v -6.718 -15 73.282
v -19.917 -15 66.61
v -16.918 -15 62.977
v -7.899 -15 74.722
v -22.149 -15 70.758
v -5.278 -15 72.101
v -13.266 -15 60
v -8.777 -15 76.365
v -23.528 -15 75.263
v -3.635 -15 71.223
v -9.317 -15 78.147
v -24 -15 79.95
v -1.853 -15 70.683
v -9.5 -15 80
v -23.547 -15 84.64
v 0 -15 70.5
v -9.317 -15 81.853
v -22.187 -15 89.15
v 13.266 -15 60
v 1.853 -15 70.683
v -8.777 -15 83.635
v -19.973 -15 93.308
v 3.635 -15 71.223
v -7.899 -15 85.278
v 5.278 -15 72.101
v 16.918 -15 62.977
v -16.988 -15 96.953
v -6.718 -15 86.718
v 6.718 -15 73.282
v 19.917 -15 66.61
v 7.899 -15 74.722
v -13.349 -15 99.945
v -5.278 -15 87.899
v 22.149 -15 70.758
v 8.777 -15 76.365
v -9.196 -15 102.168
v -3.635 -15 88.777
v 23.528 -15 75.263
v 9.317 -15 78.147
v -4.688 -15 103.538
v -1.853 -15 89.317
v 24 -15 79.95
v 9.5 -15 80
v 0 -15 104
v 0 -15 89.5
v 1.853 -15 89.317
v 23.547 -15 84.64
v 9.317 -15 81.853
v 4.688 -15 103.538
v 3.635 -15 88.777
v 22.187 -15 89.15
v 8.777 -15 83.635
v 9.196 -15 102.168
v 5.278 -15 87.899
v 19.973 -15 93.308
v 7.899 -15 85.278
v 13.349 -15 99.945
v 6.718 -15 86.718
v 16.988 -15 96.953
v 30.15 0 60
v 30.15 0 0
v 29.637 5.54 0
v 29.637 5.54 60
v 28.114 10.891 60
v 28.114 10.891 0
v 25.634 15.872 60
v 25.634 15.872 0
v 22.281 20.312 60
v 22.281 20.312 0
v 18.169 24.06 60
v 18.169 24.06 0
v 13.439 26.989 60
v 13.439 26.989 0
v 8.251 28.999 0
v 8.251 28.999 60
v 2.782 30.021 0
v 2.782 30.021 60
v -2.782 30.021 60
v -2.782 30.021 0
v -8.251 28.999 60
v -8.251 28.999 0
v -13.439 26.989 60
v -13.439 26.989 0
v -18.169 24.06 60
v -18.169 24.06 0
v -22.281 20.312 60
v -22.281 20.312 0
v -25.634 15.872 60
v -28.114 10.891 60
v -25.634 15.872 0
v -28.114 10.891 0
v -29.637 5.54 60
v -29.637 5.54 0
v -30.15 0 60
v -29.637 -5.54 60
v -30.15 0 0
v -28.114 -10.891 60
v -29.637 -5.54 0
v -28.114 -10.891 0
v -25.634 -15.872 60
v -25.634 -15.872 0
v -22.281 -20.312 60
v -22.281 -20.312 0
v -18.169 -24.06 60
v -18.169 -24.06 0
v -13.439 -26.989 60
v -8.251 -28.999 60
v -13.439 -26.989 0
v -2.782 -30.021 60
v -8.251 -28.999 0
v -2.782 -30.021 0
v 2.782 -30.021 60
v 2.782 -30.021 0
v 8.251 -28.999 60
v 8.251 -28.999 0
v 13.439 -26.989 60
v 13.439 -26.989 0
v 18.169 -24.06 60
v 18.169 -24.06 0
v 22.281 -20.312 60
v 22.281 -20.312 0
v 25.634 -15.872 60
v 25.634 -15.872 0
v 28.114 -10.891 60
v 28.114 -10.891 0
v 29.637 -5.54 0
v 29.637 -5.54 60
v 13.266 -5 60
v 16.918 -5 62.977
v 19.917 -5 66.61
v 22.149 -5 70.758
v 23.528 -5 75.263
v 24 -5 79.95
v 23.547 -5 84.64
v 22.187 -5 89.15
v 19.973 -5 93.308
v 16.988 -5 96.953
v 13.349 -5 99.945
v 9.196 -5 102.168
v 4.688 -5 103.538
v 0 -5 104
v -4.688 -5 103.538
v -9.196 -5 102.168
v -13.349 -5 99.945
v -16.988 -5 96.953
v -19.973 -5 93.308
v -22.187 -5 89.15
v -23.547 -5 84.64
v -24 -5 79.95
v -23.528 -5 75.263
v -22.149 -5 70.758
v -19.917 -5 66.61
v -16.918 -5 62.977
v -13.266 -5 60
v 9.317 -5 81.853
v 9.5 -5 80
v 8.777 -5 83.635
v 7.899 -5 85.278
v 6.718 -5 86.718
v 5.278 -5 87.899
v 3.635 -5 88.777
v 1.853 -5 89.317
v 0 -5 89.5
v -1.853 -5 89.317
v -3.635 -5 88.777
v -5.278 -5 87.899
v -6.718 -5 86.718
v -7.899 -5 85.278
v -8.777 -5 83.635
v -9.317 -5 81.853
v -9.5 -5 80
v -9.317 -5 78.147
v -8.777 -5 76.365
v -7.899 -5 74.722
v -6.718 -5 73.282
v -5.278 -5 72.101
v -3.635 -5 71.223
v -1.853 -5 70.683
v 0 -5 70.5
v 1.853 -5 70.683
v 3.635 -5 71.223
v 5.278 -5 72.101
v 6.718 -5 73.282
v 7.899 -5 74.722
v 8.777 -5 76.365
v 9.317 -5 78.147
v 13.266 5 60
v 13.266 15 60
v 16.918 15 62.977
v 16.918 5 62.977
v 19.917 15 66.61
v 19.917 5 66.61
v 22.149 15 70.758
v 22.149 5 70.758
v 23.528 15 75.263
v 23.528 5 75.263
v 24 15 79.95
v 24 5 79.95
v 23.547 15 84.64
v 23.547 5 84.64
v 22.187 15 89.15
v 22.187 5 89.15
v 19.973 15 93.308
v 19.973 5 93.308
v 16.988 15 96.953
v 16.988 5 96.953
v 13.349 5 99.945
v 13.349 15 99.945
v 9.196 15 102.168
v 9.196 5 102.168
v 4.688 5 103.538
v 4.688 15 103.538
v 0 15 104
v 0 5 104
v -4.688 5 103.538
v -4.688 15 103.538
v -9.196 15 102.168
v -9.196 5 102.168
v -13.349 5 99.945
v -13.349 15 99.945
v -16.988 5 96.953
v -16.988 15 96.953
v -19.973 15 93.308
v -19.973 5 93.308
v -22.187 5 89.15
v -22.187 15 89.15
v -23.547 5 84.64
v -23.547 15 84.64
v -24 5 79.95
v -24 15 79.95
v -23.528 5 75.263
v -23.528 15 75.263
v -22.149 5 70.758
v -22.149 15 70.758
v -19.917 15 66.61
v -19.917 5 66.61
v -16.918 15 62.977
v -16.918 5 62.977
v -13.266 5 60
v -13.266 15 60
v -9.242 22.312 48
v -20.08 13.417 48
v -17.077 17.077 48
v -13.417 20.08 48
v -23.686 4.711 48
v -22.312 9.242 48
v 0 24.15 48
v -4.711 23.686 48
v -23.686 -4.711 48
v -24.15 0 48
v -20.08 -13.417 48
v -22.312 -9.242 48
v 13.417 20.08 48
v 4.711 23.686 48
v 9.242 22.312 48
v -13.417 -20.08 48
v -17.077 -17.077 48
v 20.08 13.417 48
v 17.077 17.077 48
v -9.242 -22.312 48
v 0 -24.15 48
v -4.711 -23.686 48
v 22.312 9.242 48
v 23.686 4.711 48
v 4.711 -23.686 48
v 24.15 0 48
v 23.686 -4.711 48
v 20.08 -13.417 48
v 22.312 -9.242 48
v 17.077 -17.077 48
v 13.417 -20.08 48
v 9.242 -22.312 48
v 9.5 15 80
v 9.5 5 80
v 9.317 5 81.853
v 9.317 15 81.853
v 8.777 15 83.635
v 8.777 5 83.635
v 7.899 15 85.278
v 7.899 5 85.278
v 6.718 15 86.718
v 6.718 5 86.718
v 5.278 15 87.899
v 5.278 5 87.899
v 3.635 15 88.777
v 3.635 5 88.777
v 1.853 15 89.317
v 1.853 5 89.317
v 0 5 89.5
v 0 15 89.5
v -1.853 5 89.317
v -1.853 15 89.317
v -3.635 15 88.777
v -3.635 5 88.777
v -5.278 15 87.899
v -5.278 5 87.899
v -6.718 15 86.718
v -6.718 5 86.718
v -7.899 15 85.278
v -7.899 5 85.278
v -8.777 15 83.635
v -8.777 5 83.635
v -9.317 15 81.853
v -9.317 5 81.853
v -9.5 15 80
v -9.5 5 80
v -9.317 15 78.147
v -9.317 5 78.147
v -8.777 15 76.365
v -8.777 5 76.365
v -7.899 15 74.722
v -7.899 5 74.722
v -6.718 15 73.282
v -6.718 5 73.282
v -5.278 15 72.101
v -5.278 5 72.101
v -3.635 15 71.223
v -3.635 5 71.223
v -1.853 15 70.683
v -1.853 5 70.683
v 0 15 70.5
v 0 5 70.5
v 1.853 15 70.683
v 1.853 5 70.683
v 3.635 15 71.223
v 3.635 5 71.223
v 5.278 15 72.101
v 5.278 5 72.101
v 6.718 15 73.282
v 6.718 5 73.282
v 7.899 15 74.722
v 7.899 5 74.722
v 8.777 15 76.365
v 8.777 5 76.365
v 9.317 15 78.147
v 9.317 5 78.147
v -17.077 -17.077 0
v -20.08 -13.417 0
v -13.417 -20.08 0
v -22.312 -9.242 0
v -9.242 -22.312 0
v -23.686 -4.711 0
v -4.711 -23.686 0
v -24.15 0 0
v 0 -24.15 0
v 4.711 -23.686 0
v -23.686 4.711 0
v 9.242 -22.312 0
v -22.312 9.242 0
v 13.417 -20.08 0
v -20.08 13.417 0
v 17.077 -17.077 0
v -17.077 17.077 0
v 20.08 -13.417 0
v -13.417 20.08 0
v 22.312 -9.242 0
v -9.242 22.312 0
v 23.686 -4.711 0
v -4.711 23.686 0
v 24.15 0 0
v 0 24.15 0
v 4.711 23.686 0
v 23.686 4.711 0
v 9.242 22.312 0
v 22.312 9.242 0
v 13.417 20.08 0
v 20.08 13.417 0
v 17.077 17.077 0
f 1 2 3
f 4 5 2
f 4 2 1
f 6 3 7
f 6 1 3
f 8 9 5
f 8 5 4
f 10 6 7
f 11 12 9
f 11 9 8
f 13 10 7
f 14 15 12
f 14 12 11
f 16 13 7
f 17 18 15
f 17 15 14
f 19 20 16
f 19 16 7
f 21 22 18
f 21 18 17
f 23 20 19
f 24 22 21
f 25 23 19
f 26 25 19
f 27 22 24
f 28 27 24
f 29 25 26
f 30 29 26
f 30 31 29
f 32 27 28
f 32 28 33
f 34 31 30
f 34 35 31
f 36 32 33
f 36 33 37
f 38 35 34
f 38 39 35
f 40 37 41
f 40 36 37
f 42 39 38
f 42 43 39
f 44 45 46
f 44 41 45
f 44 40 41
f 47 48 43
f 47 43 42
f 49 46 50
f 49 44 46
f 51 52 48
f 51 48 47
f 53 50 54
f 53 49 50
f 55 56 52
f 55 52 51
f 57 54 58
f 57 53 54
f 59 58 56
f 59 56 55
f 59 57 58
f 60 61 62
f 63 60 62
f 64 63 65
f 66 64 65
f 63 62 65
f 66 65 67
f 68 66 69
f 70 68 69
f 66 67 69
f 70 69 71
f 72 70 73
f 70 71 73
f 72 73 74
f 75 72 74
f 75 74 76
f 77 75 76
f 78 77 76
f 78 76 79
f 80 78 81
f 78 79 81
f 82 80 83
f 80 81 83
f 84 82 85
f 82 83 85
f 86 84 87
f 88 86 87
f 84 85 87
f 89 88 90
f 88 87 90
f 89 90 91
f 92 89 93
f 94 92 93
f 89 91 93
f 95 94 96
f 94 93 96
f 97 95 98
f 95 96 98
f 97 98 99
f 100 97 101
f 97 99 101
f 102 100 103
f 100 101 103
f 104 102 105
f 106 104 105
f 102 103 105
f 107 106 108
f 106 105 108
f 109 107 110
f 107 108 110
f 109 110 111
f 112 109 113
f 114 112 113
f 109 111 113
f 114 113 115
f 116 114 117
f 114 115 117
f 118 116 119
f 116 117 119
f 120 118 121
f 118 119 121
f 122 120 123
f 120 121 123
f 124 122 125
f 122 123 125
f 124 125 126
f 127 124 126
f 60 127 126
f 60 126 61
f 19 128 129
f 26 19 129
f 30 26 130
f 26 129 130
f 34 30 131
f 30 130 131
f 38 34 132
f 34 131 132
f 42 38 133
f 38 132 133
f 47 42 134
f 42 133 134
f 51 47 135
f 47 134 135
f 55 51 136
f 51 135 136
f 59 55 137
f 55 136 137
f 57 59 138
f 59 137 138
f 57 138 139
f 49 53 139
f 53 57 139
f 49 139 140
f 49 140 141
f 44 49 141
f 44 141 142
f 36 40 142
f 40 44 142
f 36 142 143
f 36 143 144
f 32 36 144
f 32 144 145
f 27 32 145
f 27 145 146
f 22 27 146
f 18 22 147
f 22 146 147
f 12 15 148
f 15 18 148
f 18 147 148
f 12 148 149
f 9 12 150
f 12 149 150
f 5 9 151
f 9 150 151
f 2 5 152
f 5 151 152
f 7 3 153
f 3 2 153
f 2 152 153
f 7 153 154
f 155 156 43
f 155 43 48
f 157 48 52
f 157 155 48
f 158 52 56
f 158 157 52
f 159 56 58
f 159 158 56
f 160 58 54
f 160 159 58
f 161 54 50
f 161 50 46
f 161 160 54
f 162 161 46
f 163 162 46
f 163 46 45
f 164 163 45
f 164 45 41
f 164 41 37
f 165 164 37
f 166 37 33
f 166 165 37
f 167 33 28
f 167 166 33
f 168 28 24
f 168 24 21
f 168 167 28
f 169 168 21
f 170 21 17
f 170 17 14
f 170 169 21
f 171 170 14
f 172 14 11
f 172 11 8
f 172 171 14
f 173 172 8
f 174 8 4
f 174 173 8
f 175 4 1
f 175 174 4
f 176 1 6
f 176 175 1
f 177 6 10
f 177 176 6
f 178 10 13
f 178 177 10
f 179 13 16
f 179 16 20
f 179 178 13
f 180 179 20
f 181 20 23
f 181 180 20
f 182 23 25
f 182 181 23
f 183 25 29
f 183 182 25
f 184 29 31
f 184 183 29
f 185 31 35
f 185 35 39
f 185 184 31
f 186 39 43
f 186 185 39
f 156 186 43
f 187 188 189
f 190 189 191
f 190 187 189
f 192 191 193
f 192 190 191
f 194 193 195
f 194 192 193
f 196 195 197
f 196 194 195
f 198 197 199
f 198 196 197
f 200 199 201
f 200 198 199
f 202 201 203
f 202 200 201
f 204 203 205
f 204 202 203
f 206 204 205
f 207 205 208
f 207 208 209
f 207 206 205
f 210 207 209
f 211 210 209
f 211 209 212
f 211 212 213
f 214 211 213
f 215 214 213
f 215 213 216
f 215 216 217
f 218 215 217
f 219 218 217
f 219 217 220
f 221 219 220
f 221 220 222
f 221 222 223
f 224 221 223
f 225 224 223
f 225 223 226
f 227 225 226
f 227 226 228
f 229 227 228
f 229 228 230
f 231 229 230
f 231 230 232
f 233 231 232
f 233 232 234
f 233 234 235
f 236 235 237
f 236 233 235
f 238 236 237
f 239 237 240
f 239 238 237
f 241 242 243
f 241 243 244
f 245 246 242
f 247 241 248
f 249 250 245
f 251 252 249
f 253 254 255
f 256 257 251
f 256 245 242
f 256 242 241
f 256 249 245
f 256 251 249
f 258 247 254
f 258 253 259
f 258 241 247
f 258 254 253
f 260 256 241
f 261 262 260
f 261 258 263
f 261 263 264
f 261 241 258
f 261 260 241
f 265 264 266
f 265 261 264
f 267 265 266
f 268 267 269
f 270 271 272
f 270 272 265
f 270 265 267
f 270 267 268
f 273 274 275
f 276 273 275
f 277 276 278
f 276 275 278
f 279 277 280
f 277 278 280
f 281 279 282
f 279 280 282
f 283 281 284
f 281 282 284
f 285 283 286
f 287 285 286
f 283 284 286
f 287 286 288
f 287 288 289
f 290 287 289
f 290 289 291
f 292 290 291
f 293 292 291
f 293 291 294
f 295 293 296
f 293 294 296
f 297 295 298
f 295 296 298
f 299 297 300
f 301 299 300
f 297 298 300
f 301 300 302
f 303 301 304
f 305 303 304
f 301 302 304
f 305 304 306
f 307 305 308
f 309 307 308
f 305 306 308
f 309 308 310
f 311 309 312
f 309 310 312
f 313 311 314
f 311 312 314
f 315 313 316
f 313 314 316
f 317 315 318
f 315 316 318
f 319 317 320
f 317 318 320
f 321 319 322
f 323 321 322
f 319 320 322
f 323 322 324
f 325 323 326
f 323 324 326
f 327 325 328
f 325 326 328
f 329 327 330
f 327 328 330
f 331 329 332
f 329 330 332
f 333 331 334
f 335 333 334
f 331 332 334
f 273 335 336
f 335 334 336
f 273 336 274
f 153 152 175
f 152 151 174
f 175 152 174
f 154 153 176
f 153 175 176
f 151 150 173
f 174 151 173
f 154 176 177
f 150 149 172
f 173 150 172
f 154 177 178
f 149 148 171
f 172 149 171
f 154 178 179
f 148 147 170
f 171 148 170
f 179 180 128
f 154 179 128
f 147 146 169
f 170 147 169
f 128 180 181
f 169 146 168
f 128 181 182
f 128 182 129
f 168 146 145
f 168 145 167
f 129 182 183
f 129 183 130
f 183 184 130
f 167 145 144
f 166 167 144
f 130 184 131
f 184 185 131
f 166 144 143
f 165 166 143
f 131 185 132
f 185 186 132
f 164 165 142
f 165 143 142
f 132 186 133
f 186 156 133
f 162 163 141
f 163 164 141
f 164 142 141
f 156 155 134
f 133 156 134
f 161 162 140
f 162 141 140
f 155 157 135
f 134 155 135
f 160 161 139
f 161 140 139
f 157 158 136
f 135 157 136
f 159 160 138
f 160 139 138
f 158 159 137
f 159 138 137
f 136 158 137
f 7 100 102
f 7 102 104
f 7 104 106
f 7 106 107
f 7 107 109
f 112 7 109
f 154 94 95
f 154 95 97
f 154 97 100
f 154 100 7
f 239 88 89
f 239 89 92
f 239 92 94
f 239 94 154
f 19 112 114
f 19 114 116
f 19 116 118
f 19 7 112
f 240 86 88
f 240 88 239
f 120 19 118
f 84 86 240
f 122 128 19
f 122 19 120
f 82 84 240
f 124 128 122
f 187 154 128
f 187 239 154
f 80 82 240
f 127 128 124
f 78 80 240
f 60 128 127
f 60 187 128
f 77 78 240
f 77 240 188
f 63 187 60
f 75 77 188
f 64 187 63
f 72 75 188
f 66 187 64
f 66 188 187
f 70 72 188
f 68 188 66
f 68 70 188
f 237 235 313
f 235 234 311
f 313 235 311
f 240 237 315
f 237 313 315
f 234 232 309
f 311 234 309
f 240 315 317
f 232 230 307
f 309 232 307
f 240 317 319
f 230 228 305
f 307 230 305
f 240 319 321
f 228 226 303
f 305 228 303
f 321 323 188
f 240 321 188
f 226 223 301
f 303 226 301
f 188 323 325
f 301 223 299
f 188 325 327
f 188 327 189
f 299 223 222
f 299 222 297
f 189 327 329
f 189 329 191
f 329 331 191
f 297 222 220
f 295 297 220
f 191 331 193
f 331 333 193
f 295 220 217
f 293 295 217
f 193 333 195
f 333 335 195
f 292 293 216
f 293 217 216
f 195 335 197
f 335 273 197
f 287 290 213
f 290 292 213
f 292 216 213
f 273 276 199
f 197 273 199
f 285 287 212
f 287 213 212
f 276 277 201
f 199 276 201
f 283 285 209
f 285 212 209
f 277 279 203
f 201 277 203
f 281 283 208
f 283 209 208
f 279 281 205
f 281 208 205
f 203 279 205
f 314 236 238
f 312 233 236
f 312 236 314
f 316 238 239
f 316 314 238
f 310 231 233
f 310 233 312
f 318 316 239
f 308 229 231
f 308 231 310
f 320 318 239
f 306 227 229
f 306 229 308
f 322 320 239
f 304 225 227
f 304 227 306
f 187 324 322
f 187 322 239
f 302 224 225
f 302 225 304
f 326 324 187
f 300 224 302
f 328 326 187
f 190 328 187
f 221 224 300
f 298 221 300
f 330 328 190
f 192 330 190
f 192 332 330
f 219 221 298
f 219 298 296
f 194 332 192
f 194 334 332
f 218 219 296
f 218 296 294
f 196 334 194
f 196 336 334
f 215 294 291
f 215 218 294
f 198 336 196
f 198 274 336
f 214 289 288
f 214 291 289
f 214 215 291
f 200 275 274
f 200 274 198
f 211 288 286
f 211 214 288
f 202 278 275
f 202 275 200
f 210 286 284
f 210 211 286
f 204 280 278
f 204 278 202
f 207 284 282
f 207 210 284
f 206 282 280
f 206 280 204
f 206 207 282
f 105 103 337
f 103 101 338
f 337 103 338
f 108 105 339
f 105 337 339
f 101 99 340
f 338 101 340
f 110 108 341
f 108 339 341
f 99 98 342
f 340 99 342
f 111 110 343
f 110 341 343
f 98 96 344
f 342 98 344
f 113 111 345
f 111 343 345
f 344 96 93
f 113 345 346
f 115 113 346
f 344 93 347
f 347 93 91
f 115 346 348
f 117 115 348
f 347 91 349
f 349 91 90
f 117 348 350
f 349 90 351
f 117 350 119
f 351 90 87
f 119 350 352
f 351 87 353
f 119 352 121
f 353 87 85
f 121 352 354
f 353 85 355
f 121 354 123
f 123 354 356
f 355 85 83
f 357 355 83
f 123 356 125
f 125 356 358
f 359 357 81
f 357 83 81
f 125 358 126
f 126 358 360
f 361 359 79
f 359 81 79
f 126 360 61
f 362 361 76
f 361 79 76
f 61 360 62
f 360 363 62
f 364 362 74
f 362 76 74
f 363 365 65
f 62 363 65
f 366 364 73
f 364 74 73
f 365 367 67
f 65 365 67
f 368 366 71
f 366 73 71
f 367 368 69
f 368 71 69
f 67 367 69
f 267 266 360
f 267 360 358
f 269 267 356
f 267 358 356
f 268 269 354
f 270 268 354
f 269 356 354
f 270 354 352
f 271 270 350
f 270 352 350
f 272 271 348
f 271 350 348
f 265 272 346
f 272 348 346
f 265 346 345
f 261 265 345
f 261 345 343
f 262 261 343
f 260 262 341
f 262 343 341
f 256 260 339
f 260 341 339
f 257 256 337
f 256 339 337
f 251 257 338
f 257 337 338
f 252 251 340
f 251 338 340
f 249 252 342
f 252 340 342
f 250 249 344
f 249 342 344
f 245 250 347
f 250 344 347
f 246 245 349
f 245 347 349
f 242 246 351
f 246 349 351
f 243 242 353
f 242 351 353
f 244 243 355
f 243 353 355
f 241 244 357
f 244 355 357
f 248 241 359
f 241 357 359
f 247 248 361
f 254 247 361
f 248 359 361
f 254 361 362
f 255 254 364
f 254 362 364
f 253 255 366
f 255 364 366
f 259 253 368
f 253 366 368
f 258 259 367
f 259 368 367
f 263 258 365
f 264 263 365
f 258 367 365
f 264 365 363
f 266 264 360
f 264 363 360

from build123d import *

# Parameters (mm, degrees)
SKETCH_R      = 30.15
PAD_DEPTH     = 60
SKETCH001_R   = 24.15
POCKET_DEPTH  = 48
SKETCH002_R   = 24
SKETCH002_R_2 = 9.5
PAD001_DEPTH  = 10
SKETCH003_R   = 24
SKETCH003_R_2 = 9.5
PAD002_DEPTH  = 10


with BuildPart() as part:
    # Sketch → Pad (new body)
    with BuildSketch(Plane.XY):
        Circle(SKETCH_R)
    extrude(amount=PAD_DEPTH)

    # Sketch001 (on Face2 of Pad) → Pocket (cut)
    with BuildSketch(Plane(origin=(0, 0, 0), x_dir=(1, 0, 0), z_dir=(0, 0, -1))):
        Circle(SKETCH001_R)
    extrude(amount=-POCKET_DEPTH, mode=Mode.SUBTRACT)

    # Sketch002 → Pad001 (join)
    with BuildSketch(Plane.XZ.offset(5)):
        with Locations((0, 80)):
            Circle(SKETCH002_R)
        with Locations((0, 80)):
            Circle(SKETCH002_R_2, mode=Mode.SUBTRACT)
    extrude(amount=PAD001_DEPTH)

    # Sketch003 → Pad002 (join)
    with BuildSketch(Plane.XZ.offset(-5)):
        with Locations((0, 80)):
            Circle(SKETCH003_R)
        with Locations((0, 80)):
            Circle(SKETCH003_R_2, mode=Mode.SUBTRACT)
    extrude(amount=-PAD002_DEPTH)


solid = part.part
